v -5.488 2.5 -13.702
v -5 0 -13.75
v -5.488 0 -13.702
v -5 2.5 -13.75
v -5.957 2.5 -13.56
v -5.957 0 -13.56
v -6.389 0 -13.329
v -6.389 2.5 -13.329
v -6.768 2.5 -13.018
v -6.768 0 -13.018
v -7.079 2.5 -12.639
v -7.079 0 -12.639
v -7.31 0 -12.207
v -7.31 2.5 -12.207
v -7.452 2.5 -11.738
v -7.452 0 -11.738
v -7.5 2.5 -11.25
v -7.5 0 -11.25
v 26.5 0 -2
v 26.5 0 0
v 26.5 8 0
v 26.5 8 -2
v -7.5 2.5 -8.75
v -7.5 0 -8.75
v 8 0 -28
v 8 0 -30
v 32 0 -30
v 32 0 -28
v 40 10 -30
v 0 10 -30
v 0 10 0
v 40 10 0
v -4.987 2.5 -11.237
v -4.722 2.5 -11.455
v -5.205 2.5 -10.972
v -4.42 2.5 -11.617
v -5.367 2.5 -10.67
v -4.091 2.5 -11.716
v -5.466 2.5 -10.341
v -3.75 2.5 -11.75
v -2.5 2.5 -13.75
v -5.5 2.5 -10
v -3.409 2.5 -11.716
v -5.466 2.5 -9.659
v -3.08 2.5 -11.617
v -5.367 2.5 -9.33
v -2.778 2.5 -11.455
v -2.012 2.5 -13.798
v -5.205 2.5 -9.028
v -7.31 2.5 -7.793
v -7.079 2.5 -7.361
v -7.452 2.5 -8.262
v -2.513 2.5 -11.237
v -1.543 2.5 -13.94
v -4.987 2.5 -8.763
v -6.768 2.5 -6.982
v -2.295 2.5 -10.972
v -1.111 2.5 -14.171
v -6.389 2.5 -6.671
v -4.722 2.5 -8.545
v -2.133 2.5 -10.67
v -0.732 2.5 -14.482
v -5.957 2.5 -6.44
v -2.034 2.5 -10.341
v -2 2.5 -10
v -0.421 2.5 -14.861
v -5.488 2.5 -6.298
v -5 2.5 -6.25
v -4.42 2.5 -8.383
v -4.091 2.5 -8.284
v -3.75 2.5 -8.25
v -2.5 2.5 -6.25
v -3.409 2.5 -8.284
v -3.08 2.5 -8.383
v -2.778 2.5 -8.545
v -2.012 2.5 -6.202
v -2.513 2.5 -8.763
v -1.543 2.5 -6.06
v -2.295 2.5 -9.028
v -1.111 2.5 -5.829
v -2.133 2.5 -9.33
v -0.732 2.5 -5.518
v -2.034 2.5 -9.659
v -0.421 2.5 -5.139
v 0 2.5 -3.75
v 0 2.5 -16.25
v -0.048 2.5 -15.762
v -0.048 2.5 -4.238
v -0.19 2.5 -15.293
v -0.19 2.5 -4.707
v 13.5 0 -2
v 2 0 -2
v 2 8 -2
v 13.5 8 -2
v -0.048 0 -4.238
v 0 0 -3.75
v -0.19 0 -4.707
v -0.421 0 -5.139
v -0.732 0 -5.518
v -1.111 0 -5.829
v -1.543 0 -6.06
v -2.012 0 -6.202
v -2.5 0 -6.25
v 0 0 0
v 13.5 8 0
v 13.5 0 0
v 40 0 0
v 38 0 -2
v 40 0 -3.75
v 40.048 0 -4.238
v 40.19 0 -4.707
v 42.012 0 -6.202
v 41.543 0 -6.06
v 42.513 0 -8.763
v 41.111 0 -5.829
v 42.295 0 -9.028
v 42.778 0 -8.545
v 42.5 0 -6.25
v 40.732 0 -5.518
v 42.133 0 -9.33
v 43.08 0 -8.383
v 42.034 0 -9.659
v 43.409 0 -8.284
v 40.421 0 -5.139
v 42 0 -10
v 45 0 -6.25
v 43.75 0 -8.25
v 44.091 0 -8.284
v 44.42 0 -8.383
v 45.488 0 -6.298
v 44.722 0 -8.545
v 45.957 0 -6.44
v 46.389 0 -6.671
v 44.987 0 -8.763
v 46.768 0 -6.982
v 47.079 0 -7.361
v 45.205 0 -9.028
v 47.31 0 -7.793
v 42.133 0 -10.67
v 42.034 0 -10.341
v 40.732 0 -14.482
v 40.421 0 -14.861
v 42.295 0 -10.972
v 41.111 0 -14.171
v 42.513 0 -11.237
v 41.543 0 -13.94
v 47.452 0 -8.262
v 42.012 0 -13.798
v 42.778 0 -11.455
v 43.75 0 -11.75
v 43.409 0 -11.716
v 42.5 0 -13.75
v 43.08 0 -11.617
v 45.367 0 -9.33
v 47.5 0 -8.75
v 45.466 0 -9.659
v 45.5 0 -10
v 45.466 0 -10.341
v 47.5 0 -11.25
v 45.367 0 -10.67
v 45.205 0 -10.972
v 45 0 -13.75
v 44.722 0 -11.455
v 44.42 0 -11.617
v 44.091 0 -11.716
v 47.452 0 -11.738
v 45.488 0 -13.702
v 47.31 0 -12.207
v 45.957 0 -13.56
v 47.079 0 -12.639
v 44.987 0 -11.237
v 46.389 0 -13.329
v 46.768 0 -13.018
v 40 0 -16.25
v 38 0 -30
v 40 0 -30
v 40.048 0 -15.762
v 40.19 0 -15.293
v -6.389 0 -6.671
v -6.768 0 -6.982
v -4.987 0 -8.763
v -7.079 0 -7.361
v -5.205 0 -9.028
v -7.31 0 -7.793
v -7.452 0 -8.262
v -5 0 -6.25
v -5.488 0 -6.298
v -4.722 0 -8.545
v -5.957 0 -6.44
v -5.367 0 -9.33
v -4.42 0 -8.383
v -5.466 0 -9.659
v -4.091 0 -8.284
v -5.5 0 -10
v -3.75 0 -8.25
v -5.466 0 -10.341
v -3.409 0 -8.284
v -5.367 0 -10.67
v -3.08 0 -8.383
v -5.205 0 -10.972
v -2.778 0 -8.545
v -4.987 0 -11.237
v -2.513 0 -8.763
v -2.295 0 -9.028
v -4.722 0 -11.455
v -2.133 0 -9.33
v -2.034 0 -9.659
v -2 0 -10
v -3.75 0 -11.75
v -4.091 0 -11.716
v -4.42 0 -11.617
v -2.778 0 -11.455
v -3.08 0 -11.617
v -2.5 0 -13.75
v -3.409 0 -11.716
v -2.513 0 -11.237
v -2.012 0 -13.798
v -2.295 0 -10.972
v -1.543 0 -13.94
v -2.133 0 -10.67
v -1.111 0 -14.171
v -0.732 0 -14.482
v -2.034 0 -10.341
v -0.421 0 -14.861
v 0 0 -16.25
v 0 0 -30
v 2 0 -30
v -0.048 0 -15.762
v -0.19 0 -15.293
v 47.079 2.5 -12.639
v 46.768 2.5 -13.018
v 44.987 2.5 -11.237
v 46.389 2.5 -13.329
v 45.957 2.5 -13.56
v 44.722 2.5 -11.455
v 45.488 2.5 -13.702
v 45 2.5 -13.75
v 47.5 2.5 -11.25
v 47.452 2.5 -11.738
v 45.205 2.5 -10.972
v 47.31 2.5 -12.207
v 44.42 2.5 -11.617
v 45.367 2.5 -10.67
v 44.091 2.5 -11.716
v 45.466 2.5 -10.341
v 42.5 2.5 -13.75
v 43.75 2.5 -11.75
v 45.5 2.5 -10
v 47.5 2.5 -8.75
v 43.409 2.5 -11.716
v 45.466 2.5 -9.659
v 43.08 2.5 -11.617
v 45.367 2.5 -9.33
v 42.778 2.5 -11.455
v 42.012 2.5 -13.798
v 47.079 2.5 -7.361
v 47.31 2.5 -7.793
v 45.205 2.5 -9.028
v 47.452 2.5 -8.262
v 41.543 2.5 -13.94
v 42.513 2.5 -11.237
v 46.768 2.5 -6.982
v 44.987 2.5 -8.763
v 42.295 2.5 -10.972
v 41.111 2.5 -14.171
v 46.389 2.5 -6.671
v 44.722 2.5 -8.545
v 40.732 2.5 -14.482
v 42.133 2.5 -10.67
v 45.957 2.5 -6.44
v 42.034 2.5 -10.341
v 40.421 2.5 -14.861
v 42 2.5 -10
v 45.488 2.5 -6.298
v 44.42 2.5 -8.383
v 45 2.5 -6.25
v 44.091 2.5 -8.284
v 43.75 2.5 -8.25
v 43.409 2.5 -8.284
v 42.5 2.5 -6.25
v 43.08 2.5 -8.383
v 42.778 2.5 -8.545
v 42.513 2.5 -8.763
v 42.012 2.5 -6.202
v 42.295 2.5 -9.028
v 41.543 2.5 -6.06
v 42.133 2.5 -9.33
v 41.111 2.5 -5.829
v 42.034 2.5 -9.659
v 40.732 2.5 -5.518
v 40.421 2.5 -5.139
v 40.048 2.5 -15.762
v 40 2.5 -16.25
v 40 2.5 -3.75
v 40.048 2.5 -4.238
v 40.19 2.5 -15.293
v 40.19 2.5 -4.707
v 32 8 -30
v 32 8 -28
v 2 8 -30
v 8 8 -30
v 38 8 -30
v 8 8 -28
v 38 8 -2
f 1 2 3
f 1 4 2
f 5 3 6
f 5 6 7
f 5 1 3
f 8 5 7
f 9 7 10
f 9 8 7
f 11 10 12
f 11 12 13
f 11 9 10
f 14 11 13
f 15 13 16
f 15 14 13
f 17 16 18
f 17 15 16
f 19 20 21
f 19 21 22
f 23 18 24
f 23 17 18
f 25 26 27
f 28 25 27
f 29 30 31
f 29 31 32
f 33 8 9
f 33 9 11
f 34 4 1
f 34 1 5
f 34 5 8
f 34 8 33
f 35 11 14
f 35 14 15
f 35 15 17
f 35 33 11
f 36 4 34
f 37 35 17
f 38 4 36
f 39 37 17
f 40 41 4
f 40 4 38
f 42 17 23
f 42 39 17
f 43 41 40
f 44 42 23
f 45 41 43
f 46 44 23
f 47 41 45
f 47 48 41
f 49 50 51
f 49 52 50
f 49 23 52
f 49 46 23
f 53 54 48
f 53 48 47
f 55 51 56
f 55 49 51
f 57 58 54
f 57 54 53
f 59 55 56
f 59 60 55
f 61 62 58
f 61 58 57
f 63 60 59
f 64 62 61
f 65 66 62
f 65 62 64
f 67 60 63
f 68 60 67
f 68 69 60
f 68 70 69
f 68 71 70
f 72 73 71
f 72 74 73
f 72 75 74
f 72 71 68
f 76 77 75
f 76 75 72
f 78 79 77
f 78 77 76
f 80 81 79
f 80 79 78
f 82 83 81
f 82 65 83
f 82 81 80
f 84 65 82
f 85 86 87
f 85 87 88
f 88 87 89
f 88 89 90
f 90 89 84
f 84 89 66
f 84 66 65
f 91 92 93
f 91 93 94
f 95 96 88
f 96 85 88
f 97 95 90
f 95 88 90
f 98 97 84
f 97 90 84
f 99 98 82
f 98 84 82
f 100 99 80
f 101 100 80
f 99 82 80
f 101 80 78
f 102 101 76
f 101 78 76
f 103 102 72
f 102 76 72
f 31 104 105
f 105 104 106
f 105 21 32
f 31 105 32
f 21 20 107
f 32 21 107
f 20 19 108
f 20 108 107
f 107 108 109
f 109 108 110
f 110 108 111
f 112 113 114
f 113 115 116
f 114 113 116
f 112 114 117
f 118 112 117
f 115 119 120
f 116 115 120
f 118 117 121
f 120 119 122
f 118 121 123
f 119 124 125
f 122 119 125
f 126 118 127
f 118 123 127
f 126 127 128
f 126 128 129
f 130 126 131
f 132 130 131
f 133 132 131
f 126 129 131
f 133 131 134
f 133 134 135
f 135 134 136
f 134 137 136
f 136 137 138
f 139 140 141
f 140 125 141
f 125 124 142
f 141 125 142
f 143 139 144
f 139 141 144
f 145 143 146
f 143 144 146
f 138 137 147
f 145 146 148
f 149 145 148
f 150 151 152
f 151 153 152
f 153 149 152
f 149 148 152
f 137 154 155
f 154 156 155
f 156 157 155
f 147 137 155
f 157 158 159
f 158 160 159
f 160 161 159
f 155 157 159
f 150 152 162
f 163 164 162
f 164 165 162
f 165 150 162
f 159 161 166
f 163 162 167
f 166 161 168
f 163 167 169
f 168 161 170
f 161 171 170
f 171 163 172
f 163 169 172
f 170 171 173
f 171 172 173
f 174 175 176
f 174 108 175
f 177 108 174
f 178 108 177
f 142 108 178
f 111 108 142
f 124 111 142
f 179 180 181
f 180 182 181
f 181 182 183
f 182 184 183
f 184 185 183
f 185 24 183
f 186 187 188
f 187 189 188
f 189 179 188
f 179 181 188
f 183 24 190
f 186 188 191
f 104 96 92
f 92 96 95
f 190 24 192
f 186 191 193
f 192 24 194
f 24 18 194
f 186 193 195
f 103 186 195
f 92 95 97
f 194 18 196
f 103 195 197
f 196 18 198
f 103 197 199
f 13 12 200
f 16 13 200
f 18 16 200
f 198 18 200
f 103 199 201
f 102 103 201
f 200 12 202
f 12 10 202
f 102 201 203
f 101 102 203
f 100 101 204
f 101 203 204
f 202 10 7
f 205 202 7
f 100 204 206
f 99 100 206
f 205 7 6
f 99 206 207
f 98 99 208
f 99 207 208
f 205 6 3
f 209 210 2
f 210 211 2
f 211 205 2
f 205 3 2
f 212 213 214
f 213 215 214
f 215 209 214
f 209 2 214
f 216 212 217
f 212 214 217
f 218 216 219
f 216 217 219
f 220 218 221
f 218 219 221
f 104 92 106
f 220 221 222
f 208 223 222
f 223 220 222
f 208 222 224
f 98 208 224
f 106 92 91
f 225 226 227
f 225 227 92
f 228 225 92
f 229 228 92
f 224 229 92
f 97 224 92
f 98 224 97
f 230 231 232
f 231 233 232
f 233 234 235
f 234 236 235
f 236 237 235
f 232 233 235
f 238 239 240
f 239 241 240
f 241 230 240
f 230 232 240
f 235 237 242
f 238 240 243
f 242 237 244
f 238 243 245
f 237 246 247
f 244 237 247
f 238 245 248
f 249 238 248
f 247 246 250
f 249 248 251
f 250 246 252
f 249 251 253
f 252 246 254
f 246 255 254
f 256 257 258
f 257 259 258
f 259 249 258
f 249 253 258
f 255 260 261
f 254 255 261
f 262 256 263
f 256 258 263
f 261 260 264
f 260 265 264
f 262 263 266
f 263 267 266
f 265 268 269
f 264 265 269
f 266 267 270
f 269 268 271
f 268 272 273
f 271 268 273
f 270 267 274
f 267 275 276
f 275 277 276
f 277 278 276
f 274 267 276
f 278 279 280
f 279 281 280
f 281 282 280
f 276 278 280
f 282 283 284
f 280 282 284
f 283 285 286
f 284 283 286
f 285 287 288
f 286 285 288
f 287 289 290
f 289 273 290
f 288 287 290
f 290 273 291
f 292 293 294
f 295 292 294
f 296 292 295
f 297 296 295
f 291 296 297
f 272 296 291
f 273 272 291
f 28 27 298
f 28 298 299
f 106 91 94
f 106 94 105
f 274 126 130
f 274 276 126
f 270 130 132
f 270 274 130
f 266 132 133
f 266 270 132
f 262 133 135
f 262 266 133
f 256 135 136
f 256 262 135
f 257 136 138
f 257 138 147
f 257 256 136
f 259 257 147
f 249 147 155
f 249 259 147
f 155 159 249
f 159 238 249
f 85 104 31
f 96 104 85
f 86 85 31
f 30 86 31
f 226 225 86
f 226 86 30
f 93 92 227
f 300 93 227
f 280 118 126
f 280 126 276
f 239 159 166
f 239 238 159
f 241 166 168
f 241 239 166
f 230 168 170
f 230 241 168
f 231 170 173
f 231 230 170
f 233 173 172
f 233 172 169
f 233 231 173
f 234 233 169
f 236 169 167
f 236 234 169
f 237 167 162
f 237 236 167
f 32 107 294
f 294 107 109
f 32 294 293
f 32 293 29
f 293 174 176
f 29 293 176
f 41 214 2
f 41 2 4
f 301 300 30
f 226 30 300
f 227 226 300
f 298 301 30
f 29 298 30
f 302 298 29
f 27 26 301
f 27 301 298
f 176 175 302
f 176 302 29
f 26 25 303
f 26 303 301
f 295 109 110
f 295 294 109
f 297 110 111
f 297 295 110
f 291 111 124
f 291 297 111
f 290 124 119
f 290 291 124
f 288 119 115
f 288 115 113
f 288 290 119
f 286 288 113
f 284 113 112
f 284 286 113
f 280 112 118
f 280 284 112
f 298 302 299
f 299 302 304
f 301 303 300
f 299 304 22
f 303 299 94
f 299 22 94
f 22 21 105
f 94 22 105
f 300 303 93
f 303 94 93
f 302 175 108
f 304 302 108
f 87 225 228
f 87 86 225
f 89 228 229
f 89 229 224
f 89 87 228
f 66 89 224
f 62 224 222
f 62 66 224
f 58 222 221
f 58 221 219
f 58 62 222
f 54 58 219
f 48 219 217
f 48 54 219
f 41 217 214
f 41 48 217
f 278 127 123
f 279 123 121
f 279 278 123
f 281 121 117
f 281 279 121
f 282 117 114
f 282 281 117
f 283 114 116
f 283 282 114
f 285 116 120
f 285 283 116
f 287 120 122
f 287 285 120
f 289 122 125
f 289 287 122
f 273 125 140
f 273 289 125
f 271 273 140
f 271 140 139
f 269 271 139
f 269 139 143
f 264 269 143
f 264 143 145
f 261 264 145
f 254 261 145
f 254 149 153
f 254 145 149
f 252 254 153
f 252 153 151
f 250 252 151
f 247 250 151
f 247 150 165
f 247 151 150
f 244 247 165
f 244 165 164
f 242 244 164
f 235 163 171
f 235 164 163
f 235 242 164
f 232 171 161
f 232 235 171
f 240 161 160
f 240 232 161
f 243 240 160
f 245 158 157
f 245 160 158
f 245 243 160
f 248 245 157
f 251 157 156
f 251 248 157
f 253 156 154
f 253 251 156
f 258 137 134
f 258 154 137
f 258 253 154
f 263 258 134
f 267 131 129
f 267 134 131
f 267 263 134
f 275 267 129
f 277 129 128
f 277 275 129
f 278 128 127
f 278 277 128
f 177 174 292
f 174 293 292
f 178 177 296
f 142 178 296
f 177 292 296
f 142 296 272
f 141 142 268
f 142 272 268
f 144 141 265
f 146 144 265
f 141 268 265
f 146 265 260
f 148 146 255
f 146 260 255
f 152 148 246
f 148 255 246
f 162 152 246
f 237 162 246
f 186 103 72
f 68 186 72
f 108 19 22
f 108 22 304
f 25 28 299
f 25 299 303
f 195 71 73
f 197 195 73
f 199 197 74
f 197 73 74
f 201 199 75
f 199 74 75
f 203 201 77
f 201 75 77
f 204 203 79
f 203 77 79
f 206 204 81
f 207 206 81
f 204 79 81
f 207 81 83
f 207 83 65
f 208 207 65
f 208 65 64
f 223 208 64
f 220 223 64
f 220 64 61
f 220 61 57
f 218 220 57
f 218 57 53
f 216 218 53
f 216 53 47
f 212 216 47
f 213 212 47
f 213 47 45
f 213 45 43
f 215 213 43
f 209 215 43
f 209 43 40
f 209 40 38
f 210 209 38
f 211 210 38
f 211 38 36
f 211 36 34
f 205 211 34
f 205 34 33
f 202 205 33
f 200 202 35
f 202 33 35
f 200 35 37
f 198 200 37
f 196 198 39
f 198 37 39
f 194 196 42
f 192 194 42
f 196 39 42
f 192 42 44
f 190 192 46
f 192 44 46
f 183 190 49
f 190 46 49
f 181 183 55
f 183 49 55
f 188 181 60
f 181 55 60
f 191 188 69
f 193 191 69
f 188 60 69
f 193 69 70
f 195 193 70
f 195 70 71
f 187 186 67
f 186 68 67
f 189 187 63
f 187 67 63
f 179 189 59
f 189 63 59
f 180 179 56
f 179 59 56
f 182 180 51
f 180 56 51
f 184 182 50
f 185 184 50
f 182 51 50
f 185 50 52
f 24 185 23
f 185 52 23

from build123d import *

# Parameters (mm, degrees)
SKETCH1_W           = 40
SKETCH1_H           = 30
BOSS_EXTRUDE1_DEPTH = 10
CUT_EXTRUDE1_DEPTH  = 8
SKETCH3_W           = 7.5
SKETCH3_H           = 2.5
BOSS_EXTRUDE2_DEPTH = 7.5
SKETCH4_R           = 1.75
CUT_EXTRUDE2_DEPTH  = 51.55937104
FILLET1_R           = 2.5
FILLET2_R           = 2.5


with BuildPart() as part:
    # Sketch1 → Boss-Extrude1 (new body)
    with BuildSketch(Plane(origin=(0, 0, 0), x_dir=(1, 0, 0), z_dir=(0, 1, 0))):
        with Locations((20, 15)):
            Rectangle(SKETCH1_W, SKETCH1_H)
    extrude(amount=BOSS_EXTRUDE1_DEPTH)

    # Sketch2 → Cut-Extrude1 (cut)
    with BuildSketch(Plane.XZ):
        Polygon((13.5, 0), (26.5, 0), (26.5, -2), (38, -2), (38, -28), (38, -30), (32, -30), (32, -28), (8, -28), (8, -30), (2, -30), (2, -28), (2, -2), (13.5, -2), align=None)
    extrude(amount=-CUT_EXTRUDE1_DEPTH, mode=Mode.SUBTRACT)

    # Sketch3 → Boss-Extrude2 (add)
    with BuildSketch(Plane.ZY):
        with Locations((-10, 1.25)):
            Rectangle(SKETCH3_W, SKETCH3_H)
    boss_extrude2 = extrude(amount=BOSS_EXTRUDE2_DEPTH)

    # Sketch4 → Cut-Extrude2 (cut, through all)
    with BuildSketch(Plane(origin=(0, 2.5, 0), x_dir=(1, 0, 0), z_dir=(0, 1, 0))):
        with Locations(Location((-3.75, 10, 0), (0, 0, 270))):
            Circle(SKETCH4_R)
    cut_extrude2 = extrude(amount=-CUT_EXTRUDE2_DEPTH, mode=Mode.SUBTRACT)

    # Fillet1
    fillet1_edges = [part.edges().sort_by_distance(p)[0] for p in [
        (0, 1.25, -6.25),
        (0, 1.25, -13.75),
        (-7.5, 1.25, -6.25),
        (-7.5, 1.25, -13.75),
    ]]
    fillet(fillet1_edges, radius=FILLET1_R)

    # Mirror1: Boss-Extrude2, Cut-Extrude2 across plane
    add(boss_extrude2.mirror(Plane.ZY.offset(-20)))
    add(cut_extrude2.mirror(Plane.ZY.offset(-20)), mode=Mode.SUBTRACT)

    # Fillet2
    fillet2_edges = [part.edges().sort_by_distance(p)[0] for p in [
        (47.5, 1.25, -6.25),
        (47.5, 1.25, -13.75),
        (40, 1.25, -6.25),
        (40, 1.25, -13.75),
    ]]
    fillet(fillet2_edges, radius=FILLET2_R)


solid = part.part
